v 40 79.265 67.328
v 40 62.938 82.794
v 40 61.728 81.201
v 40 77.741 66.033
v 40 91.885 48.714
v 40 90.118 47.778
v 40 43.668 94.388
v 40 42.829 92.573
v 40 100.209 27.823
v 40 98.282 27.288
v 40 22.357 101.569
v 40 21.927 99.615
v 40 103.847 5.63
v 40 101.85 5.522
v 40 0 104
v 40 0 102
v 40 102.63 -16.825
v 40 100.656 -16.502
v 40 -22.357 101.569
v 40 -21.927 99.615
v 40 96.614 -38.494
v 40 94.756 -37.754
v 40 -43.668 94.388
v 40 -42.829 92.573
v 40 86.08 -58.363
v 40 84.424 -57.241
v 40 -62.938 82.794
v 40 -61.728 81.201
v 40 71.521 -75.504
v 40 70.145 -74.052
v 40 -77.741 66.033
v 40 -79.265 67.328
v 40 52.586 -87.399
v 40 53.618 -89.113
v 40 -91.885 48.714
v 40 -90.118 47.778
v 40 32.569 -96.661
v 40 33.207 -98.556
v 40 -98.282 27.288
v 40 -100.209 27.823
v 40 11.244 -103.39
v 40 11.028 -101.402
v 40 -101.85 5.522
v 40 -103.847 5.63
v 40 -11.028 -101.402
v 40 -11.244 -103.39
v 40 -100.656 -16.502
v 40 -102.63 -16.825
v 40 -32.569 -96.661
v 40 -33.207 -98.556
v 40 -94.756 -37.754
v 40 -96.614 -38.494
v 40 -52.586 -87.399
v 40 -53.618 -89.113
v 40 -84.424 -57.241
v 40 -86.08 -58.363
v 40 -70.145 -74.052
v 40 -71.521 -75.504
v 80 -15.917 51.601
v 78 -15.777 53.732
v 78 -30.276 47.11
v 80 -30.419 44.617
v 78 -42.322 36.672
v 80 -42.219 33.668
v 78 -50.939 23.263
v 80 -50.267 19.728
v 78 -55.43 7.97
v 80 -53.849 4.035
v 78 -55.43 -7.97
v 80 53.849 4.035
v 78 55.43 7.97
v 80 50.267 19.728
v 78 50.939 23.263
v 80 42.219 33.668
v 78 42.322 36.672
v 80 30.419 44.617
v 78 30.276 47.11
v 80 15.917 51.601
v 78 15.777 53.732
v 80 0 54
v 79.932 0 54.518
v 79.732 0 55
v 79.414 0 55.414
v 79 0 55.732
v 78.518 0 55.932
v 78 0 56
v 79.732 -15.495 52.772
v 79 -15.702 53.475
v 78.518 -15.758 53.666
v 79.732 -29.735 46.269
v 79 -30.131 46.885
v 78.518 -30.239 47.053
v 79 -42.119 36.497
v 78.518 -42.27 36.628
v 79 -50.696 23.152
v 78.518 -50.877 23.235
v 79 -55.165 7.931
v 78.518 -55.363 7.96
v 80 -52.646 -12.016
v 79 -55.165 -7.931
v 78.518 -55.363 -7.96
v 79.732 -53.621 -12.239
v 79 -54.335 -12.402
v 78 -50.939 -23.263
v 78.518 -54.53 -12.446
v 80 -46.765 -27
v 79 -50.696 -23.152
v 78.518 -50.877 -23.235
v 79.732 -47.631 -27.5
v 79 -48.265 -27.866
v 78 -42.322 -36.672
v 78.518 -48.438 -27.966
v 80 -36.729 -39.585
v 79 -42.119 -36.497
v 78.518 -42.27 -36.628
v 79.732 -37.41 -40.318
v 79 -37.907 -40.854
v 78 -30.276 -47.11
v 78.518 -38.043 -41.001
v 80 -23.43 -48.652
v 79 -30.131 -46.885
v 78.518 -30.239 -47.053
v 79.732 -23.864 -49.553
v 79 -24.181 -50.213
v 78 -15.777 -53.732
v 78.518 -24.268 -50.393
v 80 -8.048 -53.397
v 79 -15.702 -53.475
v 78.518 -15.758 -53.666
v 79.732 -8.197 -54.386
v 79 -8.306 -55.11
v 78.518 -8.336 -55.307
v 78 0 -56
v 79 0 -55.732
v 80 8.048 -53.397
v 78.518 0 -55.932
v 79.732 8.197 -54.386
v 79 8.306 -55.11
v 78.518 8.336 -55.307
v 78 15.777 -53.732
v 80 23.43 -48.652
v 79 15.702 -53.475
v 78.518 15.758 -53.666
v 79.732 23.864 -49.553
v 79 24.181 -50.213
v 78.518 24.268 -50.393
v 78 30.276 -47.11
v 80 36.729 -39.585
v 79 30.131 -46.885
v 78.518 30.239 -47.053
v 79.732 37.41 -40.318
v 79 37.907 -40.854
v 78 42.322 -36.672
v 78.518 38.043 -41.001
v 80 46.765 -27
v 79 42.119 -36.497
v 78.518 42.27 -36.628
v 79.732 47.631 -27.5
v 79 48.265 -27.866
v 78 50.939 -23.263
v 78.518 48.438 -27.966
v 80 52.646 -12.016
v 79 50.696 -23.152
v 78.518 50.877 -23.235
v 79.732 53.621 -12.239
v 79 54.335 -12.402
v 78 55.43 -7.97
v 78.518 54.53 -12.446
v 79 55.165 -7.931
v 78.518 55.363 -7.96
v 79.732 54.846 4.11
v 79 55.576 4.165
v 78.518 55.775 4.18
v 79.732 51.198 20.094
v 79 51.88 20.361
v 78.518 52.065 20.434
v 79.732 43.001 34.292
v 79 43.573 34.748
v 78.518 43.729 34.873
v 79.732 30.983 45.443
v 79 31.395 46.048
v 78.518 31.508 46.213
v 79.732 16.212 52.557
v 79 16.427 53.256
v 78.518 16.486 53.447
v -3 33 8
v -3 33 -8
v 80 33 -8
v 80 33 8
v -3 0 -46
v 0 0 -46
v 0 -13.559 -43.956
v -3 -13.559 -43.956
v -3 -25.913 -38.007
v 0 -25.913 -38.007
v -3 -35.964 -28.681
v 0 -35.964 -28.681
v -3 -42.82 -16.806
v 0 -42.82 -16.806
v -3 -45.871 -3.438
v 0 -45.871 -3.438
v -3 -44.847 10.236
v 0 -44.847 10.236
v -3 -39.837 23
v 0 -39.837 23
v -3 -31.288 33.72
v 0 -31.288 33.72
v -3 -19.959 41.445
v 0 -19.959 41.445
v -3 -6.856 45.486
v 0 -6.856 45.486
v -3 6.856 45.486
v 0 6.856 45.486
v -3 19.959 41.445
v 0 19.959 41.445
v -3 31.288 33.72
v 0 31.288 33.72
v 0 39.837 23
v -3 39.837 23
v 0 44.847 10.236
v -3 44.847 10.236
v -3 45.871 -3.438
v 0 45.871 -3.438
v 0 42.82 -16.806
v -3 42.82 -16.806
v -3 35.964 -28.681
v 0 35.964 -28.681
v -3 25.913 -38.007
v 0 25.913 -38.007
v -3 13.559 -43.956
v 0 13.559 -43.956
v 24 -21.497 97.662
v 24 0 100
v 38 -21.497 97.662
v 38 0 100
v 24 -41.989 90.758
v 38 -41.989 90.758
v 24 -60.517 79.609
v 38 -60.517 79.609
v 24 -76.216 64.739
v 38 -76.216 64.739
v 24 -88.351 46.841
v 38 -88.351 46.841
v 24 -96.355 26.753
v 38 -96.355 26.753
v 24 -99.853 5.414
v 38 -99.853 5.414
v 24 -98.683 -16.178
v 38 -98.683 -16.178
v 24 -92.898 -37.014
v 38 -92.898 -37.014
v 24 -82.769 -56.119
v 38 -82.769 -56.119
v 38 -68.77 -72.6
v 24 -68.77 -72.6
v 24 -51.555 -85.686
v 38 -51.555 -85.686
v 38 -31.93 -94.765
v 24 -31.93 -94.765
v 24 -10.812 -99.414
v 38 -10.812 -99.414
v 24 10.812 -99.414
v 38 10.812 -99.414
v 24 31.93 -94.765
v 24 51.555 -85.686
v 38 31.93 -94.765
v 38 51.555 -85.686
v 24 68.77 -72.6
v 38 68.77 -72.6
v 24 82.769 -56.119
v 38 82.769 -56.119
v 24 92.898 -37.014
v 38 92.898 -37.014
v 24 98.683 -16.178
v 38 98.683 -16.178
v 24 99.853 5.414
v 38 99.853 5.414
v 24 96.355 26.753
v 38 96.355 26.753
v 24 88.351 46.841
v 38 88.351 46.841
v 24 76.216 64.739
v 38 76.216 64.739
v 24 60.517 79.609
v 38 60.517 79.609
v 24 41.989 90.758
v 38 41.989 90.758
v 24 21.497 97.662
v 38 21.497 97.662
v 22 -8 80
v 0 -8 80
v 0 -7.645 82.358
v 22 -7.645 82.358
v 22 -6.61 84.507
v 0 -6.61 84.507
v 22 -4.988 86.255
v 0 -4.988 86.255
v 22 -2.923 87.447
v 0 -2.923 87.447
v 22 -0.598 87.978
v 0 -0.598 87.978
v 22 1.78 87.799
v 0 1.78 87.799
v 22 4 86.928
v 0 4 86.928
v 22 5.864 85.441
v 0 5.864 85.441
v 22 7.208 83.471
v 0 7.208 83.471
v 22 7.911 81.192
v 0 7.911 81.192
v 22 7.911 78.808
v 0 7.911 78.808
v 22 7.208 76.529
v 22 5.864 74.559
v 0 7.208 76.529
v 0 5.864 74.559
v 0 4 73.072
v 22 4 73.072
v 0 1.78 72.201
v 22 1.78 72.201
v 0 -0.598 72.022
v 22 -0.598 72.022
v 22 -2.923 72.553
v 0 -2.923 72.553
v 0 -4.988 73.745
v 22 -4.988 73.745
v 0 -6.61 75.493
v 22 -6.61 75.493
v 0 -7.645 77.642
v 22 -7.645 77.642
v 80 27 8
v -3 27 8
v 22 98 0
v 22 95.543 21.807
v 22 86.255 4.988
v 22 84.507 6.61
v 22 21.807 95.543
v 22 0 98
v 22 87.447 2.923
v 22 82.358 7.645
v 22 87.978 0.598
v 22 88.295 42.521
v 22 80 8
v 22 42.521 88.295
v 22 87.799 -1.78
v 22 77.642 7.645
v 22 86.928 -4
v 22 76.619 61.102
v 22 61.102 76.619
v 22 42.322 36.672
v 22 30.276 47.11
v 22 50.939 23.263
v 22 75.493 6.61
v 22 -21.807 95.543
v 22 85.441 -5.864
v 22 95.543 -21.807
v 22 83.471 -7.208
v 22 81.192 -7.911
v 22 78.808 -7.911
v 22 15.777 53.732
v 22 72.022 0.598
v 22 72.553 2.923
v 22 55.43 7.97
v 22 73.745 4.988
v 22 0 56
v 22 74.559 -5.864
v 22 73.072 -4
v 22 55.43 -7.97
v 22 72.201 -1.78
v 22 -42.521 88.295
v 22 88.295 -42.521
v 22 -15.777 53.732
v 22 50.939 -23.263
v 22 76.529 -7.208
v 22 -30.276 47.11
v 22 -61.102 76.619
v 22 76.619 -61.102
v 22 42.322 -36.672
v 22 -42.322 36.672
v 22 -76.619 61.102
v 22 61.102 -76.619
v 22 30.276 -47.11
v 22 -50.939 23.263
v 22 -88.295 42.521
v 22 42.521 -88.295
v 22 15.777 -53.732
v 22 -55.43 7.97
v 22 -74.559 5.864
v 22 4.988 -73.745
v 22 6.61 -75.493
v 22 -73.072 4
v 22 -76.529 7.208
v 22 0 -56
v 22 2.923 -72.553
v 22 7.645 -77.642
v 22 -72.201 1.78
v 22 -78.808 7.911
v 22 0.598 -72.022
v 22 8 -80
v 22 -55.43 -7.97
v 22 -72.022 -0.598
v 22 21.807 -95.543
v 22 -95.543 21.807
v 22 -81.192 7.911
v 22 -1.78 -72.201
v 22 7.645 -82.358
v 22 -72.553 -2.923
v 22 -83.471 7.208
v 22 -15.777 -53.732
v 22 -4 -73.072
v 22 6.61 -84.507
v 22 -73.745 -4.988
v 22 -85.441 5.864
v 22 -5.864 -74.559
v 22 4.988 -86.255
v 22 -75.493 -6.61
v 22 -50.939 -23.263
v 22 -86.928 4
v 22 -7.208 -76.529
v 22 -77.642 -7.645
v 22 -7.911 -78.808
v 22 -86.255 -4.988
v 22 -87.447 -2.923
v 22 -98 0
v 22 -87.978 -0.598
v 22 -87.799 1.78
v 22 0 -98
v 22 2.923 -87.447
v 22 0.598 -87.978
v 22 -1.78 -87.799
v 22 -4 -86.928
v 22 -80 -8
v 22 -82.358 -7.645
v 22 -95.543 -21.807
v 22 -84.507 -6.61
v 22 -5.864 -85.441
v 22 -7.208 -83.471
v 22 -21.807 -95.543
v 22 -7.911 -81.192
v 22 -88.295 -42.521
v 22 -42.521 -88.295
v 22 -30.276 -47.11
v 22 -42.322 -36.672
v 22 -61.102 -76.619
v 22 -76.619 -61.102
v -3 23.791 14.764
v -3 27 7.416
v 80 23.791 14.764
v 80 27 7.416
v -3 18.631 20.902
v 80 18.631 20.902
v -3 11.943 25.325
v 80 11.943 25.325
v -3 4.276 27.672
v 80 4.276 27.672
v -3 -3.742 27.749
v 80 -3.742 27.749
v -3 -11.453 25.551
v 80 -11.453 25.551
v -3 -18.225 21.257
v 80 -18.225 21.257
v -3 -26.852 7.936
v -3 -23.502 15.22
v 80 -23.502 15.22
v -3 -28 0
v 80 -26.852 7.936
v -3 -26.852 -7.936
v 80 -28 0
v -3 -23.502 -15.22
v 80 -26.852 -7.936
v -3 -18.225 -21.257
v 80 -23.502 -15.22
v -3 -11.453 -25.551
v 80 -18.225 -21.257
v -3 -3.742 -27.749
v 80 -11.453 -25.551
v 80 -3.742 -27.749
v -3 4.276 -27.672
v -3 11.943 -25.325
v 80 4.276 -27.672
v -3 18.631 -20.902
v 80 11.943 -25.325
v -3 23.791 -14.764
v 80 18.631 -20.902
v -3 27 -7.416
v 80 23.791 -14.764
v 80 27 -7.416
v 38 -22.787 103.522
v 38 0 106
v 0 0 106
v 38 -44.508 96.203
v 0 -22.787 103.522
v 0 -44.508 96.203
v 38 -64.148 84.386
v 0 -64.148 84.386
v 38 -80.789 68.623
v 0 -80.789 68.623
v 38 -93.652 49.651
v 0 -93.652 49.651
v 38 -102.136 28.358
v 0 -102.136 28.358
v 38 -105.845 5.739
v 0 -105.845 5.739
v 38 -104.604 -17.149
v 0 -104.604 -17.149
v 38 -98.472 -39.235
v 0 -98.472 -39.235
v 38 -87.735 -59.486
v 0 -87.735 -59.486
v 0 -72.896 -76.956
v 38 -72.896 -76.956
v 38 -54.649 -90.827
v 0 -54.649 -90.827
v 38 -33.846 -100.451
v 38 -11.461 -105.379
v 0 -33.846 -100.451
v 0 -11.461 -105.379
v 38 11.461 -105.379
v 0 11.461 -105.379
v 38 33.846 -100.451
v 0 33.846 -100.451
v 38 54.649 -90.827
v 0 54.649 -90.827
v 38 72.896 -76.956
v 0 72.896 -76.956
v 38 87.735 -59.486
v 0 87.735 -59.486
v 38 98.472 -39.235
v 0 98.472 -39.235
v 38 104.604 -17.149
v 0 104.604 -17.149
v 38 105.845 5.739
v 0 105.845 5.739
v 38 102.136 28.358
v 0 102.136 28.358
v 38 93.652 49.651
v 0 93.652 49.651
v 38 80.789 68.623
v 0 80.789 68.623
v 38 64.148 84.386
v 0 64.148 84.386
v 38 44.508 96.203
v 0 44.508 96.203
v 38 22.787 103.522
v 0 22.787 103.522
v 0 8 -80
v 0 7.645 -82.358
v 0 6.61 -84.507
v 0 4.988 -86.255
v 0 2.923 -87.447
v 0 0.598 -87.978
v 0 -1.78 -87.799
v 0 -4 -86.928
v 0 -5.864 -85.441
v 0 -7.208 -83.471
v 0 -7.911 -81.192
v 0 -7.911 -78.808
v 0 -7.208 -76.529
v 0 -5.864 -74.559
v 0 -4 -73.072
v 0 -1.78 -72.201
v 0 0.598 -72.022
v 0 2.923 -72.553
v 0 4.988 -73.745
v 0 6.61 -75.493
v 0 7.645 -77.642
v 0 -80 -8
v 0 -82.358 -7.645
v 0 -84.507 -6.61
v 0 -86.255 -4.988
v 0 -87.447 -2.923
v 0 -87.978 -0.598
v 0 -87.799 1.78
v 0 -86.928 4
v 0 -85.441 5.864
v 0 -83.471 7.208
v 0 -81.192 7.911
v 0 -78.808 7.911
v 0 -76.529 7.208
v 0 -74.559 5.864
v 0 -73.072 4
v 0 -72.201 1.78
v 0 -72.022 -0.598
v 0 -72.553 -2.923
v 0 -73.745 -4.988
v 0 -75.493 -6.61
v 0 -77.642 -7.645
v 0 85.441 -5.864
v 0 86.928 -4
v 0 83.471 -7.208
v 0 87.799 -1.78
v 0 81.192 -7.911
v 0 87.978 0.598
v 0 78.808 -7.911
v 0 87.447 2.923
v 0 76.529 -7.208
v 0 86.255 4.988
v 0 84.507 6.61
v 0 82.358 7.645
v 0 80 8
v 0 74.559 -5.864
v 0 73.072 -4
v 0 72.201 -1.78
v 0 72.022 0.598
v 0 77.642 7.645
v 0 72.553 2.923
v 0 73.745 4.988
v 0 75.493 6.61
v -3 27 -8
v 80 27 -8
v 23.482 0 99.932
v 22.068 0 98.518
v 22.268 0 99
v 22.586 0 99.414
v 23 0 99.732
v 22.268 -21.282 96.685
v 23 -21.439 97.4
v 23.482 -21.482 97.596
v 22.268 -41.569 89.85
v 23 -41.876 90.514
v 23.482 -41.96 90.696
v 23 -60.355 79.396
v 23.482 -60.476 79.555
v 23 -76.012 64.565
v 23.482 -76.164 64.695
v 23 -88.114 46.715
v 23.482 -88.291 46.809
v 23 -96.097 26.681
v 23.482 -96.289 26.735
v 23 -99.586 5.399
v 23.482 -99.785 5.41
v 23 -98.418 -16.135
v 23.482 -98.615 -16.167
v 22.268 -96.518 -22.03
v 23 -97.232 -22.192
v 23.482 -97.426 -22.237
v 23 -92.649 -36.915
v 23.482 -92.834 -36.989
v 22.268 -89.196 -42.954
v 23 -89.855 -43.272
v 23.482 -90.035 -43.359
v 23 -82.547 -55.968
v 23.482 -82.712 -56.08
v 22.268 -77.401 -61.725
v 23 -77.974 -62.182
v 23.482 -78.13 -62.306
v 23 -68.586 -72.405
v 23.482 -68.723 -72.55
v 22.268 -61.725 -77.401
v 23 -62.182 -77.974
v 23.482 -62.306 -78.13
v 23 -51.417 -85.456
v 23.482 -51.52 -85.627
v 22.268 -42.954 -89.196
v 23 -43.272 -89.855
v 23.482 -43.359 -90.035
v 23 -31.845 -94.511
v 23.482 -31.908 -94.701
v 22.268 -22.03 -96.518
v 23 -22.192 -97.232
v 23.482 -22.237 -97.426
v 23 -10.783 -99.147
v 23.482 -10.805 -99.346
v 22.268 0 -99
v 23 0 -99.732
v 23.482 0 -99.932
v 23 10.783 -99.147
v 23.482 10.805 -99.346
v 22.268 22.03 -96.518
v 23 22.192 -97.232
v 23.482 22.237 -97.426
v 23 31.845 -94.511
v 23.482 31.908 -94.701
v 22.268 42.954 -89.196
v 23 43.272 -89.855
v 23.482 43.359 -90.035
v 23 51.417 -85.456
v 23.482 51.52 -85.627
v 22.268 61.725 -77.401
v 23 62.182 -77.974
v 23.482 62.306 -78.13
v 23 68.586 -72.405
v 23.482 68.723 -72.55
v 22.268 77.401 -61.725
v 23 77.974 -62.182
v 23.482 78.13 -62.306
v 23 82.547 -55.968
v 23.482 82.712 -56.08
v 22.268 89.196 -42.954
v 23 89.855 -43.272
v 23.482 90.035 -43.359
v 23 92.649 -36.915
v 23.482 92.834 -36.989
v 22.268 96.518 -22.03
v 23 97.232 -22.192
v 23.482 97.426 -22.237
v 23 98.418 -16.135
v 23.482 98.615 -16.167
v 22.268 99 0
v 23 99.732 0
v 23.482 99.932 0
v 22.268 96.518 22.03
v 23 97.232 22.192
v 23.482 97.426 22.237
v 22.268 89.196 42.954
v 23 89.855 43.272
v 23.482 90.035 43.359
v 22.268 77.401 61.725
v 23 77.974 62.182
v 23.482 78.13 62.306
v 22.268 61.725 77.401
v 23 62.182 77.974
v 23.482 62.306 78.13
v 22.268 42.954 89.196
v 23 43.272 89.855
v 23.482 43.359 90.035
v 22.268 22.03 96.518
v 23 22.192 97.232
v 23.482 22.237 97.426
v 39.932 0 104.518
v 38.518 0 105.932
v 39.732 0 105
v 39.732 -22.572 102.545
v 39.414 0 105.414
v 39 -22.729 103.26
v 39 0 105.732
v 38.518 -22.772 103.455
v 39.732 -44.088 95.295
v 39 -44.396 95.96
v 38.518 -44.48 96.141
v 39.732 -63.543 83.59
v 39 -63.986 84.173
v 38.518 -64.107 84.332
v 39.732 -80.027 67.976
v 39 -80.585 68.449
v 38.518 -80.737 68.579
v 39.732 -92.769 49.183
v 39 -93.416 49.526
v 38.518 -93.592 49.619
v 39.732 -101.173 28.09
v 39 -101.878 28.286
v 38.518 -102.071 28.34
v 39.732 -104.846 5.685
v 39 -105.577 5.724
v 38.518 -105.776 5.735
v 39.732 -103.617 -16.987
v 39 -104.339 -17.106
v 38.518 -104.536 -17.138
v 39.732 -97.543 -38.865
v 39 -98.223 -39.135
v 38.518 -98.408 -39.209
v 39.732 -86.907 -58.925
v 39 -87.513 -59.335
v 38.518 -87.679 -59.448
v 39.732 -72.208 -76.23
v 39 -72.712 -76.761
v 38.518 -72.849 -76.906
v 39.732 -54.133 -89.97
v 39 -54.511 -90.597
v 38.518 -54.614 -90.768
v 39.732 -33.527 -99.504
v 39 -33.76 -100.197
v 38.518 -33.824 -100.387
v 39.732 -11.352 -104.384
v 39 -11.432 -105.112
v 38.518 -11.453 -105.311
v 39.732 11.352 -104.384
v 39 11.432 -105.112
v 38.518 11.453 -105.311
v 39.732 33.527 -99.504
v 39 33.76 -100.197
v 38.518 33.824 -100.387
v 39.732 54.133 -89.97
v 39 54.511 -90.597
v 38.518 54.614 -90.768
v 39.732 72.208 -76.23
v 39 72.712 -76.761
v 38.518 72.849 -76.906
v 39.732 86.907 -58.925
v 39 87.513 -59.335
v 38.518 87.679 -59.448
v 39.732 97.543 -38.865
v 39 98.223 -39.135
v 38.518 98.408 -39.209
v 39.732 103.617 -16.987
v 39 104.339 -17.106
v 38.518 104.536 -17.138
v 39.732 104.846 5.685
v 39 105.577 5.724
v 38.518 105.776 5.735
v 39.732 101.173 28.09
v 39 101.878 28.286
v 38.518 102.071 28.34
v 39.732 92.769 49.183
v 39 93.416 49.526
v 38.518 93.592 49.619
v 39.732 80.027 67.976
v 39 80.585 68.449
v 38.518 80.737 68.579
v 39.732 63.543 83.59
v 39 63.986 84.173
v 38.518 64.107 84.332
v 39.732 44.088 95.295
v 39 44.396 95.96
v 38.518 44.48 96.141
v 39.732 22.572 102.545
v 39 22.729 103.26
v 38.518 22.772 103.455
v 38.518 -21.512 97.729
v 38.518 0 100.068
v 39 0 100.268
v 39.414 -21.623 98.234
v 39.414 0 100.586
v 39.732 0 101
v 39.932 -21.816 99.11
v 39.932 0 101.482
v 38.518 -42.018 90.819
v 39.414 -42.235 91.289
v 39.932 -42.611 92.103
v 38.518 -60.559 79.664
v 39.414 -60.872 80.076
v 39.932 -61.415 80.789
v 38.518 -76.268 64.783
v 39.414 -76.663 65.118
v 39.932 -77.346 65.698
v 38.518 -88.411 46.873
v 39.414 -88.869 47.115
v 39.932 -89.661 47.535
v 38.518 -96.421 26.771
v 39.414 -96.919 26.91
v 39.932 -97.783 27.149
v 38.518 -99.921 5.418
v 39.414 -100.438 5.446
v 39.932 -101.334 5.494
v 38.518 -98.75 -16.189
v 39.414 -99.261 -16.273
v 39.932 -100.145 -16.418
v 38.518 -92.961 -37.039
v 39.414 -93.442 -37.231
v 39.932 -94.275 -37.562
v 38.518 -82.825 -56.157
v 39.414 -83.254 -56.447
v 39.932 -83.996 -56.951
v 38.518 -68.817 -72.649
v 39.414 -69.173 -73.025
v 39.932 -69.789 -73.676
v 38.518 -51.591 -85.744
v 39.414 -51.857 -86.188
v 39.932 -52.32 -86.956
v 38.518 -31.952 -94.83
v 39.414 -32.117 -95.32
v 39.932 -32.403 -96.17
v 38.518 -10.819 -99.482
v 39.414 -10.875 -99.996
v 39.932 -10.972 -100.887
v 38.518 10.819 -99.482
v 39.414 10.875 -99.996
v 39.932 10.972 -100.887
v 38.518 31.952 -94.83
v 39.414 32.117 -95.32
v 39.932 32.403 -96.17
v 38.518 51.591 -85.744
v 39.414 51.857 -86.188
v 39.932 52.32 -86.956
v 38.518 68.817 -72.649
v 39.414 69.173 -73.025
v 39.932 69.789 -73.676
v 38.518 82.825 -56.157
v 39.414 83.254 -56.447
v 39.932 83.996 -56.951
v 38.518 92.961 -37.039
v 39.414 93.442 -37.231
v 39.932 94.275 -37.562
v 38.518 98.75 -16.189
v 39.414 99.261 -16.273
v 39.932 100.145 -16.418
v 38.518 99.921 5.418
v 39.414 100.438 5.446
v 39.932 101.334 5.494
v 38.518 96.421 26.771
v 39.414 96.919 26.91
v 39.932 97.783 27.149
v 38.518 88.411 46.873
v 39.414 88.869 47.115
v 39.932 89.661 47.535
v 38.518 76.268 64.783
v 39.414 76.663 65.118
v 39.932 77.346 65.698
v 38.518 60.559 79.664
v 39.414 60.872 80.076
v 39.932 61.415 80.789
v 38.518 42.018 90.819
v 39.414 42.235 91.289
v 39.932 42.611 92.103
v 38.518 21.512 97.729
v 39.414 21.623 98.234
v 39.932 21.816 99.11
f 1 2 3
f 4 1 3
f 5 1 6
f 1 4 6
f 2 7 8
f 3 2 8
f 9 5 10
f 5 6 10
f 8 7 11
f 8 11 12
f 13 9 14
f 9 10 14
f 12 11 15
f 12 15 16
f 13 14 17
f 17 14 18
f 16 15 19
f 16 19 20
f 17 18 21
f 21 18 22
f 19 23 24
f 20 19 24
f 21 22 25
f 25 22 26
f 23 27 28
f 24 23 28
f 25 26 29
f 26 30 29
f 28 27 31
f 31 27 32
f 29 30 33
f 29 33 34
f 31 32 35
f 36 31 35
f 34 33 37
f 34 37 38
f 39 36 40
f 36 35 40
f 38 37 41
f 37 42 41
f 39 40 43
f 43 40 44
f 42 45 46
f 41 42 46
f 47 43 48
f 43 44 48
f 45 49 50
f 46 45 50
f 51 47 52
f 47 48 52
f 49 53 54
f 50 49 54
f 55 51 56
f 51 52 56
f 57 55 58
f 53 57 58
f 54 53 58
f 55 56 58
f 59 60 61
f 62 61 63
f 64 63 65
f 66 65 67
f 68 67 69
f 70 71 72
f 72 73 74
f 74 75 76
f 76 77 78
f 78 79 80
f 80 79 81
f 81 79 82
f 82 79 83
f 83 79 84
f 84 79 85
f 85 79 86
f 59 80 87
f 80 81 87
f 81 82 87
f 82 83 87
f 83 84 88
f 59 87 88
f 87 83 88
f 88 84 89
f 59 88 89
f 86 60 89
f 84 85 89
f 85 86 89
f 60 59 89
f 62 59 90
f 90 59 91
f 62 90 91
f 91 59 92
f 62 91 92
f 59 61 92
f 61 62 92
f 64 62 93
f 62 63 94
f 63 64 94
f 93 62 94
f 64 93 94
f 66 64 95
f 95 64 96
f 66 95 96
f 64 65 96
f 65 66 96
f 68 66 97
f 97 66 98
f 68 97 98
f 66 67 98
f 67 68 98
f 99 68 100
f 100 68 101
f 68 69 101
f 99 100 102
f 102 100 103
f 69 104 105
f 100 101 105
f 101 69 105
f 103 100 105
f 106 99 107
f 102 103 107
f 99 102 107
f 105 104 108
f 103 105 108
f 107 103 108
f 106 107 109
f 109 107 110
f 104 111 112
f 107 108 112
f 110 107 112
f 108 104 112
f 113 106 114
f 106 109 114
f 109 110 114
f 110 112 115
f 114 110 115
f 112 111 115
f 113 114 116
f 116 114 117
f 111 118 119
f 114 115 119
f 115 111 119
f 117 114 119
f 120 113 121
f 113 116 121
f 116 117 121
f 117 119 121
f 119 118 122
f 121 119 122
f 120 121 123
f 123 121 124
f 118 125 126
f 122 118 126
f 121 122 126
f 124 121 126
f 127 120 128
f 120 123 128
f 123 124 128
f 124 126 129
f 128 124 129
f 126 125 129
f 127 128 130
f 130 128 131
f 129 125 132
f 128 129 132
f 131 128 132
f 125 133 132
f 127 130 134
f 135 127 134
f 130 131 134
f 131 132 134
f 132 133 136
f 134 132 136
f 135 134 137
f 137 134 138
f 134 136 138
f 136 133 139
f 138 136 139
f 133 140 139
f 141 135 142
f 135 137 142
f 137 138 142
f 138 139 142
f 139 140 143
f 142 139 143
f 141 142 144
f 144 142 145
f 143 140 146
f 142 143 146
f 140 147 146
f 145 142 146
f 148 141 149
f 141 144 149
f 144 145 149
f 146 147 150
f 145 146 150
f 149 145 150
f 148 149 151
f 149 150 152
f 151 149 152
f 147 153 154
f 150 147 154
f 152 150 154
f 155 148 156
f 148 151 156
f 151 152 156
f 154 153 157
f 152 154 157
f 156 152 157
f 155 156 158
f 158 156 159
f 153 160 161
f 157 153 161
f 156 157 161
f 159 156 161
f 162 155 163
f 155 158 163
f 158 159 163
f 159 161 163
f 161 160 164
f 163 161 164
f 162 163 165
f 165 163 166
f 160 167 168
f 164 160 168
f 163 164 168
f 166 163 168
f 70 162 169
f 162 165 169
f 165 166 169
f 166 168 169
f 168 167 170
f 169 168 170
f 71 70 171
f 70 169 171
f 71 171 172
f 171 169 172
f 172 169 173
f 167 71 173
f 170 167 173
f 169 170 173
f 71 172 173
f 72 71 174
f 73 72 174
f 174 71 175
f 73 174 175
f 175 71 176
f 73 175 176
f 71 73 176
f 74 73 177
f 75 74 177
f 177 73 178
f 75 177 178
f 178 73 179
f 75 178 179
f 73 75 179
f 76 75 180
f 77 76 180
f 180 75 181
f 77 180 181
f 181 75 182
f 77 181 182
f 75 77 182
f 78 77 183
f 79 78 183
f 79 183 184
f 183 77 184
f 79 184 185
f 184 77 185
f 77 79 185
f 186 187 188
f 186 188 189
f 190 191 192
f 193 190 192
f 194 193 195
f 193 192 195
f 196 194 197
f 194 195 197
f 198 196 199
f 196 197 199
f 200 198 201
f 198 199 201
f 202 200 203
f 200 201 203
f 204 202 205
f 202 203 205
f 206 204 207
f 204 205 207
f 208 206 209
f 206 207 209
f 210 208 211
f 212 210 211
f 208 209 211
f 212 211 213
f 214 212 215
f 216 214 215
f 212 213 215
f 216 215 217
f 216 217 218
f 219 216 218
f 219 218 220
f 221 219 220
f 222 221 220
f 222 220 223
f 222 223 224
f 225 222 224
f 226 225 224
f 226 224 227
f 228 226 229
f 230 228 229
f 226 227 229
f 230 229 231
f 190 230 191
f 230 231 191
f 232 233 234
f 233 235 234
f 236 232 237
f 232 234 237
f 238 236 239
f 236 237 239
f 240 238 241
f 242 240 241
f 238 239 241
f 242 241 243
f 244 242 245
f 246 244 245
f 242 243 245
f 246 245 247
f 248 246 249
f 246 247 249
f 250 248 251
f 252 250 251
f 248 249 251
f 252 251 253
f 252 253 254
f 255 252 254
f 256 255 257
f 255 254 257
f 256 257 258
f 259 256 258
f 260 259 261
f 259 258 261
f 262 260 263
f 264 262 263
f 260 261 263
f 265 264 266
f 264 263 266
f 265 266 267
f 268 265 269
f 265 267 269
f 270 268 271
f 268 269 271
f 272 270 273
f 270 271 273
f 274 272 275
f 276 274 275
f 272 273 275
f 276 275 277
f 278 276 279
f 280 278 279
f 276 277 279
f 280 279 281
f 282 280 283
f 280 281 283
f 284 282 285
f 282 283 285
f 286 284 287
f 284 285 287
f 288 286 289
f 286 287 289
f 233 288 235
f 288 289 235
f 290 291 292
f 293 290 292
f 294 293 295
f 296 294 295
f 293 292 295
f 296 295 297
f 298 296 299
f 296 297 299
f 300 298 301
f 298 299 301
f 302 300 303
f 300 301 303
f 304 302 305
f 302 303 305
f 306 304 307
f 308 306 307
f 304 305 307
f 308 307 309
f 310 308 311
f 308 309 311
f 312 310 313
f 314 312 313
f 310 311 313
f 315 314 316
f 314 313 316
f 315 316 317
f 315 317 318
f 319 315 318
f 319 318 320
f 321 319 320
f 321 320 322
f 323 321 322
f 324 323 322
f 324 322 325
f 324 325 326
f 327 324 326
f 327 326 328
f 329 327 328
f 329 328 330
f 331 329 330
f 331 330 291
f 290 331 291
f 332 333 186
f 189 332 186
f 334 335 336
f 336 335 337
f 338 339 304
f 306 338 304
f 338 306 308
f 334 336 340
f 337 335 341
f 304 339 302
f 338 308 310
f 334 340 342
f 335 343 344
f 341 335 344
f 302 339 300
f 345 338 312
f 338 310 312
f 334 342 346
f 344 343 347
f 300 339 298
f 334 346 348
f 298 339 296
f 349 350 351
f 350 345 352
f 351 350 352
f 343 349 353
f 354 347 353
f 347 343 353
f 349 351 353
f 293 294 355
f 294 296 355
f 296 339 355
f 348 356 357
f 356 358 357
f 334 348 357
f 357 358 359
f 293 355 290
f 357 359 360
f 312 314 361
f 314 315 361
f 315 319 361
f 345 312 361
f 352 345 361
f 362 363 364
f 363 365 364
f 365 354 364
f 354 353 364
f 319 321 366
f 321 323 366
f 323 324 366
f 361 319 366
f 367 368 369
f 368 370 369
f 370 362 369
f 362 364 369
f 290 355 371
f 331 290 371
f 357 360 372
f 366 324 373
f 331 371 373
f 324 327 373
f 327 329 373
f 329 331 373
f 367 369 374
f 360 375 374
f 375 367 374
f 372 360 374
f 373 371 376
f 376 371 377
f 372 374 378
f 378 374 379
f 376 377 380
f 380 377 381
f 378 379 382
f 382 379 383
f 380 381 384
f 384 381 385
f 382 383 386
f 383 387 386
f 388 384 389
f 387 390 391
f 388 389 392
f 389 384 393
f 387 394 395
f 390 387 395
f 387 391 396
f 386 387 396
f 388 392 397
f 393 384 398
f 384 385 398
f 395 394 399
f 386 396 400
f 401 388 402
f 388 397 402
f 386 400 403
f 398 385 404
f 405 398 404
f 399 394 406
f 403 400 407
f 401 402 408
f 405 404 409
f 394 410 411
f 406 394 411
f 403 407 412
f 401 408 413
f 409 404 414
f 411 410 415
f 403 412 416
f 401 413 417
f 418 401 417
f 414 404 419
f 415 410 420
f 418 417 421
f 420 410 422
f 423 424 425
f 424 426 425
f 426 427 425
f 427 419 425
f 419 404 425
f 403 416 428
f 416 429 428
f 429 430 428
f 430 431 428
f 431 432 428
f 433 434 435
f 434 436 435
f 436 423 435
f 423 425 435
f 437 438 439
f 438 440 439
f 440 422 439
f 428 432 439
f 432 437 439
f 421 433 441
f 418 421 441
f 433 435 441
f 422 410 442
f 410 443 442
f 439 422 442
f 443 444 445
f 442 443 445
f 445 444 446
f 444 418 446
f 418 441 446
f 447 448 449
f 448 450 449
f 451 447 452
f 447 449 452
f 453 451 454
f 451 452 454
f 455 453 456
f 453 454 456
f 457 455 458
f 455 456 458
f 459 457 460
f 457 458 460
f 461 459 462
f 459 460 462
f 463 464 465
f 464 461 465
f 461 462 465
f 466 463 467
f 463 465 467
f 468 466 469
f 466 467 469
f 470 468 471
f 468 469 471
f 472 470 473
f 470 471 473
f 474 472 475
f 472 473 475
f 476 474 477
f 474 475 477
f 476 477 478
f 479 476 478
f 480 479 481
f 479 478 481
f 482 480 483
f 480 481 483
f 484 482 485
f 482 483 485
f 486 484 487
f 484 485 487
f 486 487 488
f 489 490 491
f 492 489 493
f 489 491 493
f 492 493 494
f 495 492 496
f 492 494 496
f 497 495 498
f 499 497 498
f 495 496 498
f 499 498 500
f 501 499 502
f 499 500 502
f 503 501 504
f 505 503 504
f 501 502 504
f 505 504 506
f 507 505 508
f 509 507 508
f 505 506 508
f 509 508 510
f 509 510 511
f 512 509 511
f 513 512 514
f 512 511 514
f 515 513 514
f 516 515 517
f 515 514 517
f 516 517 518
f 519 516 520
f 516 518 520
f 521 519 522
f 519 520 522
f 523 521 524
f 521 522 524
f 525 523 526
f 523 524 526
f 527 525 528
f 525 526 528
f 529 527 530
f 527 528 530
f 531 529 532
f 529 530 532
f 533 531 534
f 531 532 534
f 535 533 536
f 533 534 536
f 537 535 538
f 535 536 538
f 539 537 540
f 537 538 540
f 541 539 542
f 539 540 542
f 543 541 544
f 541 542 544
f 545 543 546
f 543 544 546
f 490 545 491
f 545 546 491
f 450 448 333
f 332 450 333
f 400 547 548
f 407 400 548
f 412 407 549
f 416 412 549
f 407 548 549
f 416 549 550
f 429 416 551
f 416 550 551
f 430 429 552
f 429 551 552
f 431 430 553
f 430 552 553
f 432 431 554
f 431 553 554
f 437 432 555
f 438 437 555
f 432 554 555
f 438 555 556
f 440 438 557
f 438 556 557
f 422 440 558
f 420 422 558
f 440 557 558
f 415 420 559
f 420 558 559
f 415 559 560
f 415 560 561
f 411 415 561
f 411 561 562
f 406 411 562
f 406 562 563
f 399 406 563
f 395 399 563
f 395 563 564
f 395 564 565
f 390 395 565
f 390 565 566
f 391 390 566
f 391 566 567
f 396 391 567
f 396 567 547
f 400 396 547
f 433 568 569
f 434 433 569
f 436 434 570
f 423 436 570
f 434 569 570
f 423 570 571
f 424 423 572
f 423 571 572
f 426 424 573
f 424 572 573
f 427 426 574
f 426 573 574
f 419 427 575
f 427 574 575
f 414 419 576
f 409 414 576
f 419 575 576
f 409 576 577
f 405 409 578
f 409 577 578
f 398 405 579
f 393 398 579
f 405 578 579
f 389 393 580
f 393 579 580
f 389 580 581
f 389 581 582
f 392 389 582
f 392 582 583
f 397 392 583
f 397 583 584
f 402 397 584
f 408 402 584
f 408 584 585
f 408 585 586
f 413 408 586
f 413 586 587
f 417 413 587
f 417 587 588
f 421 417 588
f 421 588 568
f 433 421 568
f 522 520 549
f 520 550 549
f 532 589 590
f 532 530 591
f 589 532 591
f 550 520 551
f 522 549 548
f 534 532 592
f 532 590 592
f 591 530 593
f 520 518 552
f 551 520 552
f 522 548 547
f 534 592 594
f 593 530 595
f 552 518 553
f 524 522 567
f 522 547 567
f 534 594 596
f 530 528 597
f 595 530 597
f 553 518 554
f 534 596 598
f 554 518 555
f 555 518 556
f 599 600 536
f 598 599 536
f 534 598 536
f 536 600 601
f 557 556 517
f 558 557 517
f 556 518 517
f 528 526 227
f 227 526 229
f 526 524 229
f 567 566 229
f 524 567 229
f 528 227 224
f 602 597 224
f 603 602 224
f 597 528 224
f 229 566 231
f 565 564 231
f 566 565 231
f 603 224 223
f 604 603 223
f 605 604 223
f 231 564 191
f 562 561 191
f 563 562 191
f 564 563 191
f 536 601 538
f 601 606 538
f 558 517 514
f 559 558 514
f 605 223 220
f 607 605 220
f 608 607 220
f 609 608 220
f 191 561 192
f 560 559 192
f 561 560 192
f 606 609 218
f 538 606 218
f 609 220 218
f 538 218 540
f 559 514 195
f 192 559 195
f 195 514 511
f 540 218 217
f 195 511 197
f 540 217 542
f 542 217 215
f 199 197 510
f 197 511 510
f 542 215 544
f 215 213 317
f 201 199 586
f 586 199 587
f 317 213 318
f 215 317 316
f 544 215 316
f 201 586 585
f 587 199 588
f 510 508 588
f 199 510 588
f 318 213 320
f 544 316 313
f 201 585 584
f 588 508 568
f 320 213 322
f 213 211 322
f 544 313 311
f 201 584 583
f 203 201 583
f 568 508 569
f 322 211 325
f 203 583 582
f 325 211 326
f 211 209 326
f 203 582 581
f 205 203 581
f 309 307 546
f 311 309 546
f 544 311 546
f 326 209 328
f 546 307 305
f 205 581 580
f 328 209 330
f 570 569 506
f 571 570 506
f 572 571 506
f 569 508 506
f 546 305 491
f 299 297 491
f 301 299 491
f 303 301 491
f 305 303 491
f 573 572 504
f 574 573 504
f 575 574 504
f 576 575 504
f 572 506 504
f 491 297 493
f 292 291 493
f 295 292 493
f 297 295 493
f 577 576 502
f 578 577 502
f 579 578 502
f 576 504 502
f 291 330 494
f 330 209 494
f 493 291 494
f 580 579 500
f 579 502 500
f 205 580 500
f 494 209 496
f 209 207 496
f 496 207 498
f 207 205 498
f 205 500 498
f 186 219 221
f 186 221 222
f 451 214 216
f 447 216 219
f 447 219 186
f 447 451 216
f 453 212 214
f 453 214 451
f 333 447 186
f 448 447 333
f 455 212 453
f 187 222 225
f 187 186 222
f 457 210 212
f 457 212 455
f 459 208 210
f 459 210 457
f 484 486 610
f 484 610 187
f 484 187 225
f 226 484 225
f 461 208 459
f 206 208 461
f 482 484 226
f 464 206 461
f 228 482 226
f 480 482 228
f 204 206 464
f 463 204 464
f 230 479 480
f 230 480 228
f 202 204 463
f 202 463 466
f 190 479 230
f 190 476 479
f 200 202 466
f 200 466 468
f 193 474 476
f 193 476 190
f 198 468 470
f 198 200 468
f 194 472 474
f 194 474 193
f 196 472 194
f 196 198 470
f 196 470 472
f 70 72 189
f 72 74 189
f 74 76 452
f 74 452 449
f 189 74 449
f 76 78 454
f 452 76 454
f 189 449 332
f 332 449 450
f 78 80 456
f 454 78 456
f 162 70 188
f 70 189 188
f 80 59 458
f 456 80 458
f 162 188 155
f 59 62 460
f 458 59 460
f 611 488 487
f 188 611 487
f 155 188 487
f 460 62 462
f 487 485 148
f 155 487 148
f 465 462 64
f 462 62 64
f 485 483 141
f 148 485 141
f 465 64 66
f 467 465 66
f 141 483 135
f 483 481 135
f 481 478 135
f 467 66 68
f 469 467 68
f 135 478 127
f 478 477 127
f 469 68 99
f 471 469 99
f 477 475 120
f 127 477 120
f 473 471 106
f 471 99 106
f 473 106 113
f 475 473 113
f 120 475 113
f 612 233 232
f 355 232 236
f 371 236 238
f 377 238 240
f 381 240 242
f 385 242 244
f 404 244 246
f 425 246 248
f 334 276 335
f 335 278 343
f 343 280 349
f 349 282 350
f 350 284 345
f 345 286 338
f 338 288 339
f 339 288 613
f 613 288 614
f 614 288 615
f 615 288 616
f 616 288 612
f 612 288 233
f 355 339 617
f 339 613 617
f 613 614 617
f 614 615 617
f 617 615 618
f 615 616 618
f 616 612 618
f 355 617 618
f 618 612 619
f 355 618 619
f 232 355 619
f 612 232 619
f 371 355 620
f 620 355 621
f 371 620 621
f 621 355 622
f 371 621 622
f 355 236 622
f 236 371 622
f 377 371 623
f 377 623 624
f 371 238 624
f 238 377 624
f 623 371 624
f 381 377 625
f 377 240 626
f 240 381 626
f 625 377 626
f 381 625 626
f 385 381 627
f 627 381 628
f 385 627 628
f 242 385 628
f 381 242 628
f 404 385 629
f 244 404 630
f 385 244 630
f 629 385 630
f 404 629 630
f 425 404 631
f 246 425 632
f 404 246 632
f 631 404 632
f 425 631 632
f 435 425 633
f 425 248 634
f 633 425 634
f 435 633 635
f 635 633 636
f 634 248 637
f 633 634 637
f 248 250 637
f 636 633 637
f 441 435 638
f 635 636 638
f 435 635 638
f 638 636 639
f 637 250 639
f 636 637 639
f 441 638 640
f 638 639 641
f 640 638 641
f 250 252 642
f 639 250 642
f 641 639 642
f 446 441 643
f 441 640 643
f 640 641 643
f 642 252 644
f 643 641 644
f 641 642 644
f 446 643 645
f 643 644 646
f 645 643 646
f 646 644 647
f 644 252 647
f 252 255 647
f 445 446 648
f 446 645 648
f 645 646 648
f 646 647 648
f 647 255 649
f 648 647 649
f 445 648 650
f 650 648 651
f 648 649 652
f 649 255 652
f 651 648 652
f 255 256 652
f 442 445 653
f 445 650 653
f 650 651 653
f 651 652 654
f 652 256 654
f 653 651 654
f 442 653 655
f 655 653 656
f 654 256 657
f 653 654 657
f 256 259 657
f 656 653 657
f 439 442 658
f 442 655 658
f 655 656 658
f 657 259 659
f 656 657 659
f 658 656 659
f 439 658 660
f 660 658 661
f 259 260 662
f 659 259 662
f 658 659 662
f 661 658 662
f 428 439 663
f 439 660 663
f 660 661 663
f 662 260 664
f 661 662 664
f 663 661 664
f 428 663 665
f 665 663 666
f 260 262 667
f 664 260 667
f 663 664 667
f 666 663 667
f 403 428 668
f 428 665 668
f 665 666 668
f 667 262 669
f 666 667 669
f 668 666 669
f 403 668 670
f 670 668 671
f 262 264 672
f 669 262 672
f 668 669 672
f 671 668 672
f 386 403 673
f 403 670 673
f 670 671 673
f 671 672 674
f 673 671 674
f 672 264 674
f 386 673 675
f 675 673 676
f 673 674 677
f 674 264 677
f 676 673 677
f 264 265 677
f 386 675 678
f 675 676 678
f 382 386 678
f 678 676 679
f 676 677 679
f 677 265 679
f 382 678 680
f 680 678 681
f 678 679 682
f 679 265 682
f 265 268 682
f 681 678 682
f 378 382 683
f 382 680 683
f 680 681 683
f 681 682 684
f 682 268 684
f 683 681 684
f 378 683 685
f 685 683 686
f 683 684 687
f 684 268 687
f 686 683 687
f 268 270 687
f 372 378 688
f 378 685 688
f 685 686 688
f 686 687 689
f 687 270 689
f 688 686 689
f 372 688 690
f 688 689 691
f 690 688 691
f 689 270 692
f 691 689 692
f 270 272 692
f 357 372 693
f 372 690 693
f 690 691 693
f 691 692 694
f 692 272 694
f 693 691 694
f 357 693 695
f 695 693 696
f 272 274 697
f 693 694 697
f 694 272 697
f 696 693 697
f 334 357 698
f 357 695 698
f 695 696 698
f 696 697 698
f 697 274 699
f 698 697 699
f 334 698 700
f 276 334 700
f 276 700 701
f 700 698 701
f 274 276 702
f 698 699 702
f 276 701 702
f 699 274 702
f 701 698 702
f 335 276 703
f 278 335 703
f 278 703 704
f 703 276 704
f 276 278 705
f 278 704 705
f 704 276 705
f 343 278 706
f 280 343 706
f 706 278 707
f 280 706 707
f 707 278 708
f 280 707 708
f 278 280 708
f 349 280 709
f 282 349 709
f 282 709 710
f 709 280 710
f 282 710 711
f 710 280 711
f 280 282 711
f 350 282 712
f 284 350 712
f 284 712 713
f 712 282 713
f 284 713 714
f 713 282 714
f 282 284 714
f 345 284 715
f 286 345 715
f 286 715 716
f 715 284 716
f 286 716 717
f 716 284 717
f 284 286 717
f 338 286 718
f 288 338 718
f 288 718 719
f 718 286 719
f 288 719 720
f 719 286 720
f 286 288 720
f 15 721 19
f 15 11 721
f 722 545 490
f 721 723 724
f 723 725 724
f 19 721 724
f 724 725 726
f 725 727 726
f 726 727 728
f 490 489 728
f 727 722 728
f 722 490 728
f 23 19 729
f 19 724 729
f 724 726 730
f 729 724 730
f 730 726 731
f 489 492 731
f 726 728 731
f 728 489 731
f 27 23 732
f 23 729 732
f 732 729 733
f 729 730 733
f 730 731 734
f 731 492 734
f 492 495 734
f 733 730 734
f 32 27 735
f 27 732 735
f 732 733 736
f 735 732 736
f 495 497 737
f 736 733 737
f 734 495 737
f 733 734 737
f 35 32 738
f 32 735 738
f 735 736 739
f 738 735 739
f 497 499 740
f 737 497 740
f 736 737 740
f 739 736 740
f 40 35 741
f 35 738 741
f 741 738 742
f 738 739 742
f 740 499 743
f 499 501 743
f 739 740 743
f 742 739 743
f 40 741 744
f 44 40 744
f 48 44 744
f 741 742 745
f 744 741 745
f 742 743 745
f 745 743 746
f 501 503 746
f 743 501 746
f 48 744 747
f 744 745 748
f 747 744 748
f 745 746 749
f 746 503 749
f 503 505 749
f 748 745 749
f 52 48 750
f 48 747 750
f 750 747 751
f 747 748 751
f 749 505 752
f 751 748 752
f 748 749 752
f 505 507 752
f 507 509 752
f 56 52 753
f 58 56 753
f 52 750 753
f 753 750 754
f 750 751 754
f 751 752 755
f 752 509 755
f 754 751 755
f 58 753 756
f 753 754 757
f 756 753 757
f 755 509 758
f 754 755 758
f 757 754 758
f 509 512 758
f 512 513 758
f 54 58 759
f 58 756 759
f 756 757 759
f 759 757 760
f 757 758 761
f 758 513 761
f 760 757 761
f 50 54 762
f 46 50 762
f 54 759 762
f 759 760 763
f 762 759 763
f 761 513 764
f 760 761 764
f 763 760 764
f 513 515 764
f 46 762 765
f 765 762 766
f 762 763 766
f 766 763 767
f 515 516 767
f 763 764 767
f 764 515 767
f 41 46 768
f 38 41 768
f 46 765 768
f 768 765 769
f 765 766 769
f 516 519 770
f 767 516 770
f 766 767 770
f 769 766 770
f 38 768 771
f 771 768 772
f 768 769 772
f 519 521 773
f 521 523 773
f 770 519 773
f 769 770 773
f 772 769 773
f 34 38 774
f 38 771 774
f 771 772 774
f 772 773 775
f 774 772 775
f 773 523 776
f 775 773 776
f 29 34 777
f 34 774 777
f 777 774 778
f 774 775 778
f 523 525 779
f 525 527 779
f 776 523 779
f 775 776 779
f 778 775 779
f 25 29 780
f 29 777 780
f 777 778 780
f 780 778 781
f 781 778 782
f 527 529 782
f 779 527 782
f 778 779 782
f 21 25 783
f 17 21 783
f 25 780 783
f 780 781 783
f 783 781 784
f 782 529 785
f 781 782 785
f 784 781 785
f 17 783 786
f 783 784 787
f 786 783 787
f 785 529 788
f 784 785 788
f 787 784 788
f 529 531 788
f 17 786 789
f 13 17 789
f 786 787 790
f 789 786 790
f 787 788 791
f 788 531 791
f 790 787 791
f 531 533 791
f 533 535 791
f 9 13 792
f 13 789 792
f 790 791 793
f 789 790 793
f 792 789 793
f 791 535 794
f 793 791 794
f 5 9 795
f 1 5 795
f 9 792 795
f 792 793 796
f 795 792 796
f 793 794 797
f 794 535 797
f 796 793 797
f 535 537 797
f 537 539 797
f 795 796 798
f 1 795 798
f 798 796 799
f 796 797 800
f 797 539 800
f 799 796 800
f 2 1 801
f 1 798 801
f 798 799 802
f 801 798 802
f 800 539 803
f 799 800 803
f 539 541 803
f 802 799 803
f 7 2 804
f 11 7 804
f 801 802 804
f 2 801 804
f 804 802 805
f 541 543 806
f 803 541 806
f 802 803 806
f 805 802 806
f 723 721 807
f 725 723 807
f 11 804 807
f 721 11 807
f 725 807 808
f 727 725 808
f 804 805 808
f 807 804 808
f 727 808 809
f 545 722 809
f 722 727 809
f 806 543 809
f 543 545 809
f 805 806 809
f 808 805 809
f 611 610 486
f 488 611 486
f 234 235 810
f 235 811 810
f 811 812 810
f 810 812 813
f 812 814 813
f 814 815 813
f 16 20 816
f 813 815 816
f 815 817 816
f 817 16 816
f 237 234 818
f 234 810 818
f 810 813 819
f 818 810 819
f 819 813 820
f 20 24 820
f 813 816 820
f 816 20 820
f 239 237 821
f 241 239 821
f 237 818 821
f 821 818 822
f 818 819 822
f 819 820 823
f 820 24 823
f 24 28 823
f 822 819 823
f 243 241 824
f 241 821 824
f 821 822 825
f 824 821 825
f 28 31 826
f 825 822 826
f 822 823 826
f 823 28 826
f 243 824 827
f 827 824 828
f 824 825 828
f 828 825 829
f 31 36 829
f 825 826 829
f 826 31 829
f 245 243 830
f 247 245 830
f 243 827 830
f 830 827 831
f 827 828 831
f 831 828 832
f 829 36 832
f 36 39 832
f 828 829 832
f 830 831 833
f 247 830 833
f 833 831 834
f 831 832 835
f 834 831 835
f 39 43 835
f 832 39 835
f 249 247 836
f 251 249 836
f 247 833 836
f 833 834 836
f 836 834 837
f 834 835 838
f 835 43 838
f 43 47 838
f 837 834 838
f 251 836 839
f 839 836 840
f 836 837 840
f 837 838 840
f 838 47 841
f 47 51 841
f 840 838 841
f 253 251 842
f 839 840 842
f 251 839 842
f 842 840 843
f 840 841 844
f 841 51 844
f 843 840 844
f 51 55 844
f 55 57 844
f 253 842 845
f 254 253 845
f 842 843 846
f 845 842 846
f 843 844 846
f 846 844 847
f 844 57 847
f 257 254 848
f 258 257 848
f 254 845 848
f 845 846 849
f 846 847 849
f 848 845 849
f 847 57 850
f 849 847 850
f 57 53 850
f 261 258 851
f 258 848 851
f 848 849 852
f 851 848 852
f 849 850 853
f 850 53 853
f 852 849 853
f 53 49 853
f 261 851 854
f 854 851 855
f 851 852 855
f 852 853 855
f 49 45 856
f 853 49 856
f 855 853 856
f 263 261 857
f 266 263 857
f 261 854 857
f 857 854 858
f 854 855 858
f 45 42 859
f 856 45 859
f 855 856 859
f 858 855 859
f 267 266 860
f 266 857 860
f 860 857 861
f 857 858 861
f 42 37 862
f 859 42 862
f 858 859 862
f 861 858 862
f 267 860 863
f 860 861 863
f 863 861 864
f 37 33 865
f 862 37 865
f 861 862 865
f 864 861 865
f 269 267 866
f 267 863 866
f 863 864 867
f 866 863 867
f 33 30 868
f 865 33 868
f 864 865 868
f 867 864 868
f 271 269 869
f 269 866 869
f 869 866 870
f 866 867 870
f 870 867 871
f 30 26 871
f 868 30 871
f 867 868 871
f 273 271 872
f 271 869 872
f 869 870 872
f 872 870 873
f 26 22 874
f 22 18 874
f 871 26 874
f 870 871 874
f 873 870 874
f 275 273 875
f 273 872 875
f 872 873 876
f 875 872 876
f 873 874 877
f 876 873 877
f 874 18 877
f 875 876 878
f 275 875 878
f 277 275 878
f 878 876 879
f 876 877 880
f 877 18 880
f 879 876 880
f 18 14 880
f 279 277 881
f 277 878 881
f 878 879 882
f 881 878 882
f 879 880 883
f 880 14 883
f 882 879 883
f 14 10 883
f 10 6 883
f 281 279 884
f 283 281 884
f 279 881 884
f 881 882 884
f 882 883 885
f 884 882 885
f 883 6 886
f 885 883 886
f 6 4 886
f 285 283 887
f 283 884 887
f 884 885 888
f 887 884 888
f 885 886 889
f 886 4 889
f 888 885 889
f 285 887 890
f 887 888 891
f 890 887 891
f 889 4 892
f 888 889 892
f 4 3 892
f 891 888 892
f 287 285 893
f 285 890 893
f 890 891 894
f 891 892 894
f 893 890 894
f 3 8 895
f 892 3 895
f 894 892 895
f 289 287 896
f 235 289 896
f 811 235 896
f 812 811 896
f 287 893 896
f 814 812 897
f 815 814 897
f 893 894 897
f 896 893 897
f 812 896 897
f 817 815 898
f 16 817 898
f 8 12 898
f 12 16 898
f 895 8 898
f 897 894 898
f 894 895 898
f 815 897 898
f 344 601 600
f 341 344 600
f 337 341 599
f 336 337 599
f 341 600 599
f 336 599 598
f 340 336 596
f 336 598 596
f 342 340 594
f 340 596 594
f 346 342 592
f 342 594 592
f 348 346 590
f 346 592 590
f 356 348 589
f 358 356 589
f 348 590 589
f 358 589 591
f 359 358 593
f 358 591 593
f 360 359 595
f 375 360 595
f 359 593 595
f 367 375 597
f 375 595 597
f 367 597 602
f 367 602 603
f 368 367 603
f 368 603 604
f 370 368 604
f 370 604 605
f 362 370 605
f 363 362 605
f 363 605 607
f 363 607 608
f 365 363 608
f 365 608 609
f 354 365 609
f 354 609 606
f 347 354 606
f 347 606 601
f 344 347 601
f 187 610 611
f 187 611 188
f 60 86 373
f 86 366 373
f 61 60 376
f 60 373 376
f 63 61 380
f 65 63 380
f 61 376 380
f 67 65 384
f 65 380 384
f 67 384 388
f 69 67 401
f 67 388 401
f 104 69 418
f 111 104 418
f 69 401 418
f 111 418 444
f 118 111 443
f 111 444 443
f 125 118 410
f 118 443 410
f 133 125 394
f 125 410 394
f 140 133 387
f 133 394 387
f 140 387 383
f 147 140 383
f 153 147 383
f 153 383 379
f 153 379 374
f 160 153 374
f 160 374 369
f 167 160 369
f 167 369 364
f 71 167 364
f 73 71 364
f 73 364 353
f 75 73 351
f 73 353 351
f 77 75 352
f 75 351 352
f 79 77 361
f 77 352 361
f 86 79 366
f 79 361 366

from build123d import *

# Parameters (mm, degrees)
SKETCH3_R           = 46
BOSS_EXTRUDE1_DEPTH = 3
SKETCH2_R           = 28
CUT_EXTRUDE1_DEPTH  = 172.350517945
SKETCH5_R           = 8
CUT_EXTRUDE7_DEPTH  = 170.917627149
CIRPATTERN2_COUNT   = 4
SKETCH7_W           = 16
SKETCH7_H           = 6
CUT_EXTRUDE8_DEPTH  = 172.350517993


with BuildPart() as part:
    # Sketch1 → Revolve1 (revolve)
    with BuildSketch(Plane.XY, mode=Mode.PRIVATE) as revolve1_sk:
        with BuildLine():
            Line((0, 0), (80, 0))
            Line((80, 0), (80, 54))
            ThreePointArc((80, 54), (79.414213562, 55.414213562), (78, 56))
            Line((78, 56), (28.292682927, 56))
            Line((28.292682927, 56), (22, 56))
            Line((22, 56), (22, 98))
            ThreePointArc((22, 98), (22.585786438, 99.414213562), (24, 100))
            Line((24, 100), (38, 100))
            ThreePointArc((38, 100), (39.414213562, 100.585786438), (40, 102))
            Line((40, 102), (40, 104))
            ThreePointArc((40, 104), (39.414213562, 105.414213562), (38, 106))
            Line((38, 106), (0, 106))
            Line((0, 106), (0, 0))
        make_face()
    revolve(revolve1_sk.sketch.rotate(Axis((0, 0, 0), (1, 0, 0)), 90), axis=Axis((0, 0, 0), (1, 0, 0)))

    # Sketch3 → Boss-Extrude1 (add)
    with BuildSketch(Plane.ZY):
        with Locations(Location((0, 0, 0), (0, 0, 180))):
            Circle(SKETCH3_R)
    extrude(amount=BOSS_EXTRUDE1_DEPTH)

    # Sketch2 → Cut-Extrude1 (cut, through all)
    with BuildSketch(Plane(origin=(80, 0, 0), x_dir=(0, 0, -1), z_dir=(1, 0, 0))):
        Circle(SKETCH2_R)
    extrude(amount=-CUT_EXTRUDE1_DEPTH, mode=Mode.SUBTRACT)

    # Sketch5 → Cut-Extrude7 (cut, through all)
    with BuildSketch(Plane.ZY):
        with Locations((0, 80)):
            Circle(SKETCH5_R)
    cut_extrude7 = extrude(amount=-CUT_EXTRUDE7_DEPTH, mode=Mode.SUBTRACT)

    # CirPattern2: Cut-Extrude7 ×4 about axis
    cirpattern2_axis = Axis((0, 0, 0), (1, 0, 0))
    for i in range(1, CIRPATTERN2_COUNT):
        add(cut_extrude7.rotate(cirpattern2_axis, i * 360 / CIRPATTERN2_COUNT), mode=Mode.SUBTRACT)

    # Sketch7 → Cut-Extrude8 (cut, through all)
    with BuildSketch(Plane.ZY.offset(3)):
        with Locations((0, 30)):
            Rectangle(SKETCH7_W, SKETCH7_H)
    extrude(amount=-CUT_EXTRUDE8_DEPTH, mode=Mode.SUBTRACT)


solid = part.part
